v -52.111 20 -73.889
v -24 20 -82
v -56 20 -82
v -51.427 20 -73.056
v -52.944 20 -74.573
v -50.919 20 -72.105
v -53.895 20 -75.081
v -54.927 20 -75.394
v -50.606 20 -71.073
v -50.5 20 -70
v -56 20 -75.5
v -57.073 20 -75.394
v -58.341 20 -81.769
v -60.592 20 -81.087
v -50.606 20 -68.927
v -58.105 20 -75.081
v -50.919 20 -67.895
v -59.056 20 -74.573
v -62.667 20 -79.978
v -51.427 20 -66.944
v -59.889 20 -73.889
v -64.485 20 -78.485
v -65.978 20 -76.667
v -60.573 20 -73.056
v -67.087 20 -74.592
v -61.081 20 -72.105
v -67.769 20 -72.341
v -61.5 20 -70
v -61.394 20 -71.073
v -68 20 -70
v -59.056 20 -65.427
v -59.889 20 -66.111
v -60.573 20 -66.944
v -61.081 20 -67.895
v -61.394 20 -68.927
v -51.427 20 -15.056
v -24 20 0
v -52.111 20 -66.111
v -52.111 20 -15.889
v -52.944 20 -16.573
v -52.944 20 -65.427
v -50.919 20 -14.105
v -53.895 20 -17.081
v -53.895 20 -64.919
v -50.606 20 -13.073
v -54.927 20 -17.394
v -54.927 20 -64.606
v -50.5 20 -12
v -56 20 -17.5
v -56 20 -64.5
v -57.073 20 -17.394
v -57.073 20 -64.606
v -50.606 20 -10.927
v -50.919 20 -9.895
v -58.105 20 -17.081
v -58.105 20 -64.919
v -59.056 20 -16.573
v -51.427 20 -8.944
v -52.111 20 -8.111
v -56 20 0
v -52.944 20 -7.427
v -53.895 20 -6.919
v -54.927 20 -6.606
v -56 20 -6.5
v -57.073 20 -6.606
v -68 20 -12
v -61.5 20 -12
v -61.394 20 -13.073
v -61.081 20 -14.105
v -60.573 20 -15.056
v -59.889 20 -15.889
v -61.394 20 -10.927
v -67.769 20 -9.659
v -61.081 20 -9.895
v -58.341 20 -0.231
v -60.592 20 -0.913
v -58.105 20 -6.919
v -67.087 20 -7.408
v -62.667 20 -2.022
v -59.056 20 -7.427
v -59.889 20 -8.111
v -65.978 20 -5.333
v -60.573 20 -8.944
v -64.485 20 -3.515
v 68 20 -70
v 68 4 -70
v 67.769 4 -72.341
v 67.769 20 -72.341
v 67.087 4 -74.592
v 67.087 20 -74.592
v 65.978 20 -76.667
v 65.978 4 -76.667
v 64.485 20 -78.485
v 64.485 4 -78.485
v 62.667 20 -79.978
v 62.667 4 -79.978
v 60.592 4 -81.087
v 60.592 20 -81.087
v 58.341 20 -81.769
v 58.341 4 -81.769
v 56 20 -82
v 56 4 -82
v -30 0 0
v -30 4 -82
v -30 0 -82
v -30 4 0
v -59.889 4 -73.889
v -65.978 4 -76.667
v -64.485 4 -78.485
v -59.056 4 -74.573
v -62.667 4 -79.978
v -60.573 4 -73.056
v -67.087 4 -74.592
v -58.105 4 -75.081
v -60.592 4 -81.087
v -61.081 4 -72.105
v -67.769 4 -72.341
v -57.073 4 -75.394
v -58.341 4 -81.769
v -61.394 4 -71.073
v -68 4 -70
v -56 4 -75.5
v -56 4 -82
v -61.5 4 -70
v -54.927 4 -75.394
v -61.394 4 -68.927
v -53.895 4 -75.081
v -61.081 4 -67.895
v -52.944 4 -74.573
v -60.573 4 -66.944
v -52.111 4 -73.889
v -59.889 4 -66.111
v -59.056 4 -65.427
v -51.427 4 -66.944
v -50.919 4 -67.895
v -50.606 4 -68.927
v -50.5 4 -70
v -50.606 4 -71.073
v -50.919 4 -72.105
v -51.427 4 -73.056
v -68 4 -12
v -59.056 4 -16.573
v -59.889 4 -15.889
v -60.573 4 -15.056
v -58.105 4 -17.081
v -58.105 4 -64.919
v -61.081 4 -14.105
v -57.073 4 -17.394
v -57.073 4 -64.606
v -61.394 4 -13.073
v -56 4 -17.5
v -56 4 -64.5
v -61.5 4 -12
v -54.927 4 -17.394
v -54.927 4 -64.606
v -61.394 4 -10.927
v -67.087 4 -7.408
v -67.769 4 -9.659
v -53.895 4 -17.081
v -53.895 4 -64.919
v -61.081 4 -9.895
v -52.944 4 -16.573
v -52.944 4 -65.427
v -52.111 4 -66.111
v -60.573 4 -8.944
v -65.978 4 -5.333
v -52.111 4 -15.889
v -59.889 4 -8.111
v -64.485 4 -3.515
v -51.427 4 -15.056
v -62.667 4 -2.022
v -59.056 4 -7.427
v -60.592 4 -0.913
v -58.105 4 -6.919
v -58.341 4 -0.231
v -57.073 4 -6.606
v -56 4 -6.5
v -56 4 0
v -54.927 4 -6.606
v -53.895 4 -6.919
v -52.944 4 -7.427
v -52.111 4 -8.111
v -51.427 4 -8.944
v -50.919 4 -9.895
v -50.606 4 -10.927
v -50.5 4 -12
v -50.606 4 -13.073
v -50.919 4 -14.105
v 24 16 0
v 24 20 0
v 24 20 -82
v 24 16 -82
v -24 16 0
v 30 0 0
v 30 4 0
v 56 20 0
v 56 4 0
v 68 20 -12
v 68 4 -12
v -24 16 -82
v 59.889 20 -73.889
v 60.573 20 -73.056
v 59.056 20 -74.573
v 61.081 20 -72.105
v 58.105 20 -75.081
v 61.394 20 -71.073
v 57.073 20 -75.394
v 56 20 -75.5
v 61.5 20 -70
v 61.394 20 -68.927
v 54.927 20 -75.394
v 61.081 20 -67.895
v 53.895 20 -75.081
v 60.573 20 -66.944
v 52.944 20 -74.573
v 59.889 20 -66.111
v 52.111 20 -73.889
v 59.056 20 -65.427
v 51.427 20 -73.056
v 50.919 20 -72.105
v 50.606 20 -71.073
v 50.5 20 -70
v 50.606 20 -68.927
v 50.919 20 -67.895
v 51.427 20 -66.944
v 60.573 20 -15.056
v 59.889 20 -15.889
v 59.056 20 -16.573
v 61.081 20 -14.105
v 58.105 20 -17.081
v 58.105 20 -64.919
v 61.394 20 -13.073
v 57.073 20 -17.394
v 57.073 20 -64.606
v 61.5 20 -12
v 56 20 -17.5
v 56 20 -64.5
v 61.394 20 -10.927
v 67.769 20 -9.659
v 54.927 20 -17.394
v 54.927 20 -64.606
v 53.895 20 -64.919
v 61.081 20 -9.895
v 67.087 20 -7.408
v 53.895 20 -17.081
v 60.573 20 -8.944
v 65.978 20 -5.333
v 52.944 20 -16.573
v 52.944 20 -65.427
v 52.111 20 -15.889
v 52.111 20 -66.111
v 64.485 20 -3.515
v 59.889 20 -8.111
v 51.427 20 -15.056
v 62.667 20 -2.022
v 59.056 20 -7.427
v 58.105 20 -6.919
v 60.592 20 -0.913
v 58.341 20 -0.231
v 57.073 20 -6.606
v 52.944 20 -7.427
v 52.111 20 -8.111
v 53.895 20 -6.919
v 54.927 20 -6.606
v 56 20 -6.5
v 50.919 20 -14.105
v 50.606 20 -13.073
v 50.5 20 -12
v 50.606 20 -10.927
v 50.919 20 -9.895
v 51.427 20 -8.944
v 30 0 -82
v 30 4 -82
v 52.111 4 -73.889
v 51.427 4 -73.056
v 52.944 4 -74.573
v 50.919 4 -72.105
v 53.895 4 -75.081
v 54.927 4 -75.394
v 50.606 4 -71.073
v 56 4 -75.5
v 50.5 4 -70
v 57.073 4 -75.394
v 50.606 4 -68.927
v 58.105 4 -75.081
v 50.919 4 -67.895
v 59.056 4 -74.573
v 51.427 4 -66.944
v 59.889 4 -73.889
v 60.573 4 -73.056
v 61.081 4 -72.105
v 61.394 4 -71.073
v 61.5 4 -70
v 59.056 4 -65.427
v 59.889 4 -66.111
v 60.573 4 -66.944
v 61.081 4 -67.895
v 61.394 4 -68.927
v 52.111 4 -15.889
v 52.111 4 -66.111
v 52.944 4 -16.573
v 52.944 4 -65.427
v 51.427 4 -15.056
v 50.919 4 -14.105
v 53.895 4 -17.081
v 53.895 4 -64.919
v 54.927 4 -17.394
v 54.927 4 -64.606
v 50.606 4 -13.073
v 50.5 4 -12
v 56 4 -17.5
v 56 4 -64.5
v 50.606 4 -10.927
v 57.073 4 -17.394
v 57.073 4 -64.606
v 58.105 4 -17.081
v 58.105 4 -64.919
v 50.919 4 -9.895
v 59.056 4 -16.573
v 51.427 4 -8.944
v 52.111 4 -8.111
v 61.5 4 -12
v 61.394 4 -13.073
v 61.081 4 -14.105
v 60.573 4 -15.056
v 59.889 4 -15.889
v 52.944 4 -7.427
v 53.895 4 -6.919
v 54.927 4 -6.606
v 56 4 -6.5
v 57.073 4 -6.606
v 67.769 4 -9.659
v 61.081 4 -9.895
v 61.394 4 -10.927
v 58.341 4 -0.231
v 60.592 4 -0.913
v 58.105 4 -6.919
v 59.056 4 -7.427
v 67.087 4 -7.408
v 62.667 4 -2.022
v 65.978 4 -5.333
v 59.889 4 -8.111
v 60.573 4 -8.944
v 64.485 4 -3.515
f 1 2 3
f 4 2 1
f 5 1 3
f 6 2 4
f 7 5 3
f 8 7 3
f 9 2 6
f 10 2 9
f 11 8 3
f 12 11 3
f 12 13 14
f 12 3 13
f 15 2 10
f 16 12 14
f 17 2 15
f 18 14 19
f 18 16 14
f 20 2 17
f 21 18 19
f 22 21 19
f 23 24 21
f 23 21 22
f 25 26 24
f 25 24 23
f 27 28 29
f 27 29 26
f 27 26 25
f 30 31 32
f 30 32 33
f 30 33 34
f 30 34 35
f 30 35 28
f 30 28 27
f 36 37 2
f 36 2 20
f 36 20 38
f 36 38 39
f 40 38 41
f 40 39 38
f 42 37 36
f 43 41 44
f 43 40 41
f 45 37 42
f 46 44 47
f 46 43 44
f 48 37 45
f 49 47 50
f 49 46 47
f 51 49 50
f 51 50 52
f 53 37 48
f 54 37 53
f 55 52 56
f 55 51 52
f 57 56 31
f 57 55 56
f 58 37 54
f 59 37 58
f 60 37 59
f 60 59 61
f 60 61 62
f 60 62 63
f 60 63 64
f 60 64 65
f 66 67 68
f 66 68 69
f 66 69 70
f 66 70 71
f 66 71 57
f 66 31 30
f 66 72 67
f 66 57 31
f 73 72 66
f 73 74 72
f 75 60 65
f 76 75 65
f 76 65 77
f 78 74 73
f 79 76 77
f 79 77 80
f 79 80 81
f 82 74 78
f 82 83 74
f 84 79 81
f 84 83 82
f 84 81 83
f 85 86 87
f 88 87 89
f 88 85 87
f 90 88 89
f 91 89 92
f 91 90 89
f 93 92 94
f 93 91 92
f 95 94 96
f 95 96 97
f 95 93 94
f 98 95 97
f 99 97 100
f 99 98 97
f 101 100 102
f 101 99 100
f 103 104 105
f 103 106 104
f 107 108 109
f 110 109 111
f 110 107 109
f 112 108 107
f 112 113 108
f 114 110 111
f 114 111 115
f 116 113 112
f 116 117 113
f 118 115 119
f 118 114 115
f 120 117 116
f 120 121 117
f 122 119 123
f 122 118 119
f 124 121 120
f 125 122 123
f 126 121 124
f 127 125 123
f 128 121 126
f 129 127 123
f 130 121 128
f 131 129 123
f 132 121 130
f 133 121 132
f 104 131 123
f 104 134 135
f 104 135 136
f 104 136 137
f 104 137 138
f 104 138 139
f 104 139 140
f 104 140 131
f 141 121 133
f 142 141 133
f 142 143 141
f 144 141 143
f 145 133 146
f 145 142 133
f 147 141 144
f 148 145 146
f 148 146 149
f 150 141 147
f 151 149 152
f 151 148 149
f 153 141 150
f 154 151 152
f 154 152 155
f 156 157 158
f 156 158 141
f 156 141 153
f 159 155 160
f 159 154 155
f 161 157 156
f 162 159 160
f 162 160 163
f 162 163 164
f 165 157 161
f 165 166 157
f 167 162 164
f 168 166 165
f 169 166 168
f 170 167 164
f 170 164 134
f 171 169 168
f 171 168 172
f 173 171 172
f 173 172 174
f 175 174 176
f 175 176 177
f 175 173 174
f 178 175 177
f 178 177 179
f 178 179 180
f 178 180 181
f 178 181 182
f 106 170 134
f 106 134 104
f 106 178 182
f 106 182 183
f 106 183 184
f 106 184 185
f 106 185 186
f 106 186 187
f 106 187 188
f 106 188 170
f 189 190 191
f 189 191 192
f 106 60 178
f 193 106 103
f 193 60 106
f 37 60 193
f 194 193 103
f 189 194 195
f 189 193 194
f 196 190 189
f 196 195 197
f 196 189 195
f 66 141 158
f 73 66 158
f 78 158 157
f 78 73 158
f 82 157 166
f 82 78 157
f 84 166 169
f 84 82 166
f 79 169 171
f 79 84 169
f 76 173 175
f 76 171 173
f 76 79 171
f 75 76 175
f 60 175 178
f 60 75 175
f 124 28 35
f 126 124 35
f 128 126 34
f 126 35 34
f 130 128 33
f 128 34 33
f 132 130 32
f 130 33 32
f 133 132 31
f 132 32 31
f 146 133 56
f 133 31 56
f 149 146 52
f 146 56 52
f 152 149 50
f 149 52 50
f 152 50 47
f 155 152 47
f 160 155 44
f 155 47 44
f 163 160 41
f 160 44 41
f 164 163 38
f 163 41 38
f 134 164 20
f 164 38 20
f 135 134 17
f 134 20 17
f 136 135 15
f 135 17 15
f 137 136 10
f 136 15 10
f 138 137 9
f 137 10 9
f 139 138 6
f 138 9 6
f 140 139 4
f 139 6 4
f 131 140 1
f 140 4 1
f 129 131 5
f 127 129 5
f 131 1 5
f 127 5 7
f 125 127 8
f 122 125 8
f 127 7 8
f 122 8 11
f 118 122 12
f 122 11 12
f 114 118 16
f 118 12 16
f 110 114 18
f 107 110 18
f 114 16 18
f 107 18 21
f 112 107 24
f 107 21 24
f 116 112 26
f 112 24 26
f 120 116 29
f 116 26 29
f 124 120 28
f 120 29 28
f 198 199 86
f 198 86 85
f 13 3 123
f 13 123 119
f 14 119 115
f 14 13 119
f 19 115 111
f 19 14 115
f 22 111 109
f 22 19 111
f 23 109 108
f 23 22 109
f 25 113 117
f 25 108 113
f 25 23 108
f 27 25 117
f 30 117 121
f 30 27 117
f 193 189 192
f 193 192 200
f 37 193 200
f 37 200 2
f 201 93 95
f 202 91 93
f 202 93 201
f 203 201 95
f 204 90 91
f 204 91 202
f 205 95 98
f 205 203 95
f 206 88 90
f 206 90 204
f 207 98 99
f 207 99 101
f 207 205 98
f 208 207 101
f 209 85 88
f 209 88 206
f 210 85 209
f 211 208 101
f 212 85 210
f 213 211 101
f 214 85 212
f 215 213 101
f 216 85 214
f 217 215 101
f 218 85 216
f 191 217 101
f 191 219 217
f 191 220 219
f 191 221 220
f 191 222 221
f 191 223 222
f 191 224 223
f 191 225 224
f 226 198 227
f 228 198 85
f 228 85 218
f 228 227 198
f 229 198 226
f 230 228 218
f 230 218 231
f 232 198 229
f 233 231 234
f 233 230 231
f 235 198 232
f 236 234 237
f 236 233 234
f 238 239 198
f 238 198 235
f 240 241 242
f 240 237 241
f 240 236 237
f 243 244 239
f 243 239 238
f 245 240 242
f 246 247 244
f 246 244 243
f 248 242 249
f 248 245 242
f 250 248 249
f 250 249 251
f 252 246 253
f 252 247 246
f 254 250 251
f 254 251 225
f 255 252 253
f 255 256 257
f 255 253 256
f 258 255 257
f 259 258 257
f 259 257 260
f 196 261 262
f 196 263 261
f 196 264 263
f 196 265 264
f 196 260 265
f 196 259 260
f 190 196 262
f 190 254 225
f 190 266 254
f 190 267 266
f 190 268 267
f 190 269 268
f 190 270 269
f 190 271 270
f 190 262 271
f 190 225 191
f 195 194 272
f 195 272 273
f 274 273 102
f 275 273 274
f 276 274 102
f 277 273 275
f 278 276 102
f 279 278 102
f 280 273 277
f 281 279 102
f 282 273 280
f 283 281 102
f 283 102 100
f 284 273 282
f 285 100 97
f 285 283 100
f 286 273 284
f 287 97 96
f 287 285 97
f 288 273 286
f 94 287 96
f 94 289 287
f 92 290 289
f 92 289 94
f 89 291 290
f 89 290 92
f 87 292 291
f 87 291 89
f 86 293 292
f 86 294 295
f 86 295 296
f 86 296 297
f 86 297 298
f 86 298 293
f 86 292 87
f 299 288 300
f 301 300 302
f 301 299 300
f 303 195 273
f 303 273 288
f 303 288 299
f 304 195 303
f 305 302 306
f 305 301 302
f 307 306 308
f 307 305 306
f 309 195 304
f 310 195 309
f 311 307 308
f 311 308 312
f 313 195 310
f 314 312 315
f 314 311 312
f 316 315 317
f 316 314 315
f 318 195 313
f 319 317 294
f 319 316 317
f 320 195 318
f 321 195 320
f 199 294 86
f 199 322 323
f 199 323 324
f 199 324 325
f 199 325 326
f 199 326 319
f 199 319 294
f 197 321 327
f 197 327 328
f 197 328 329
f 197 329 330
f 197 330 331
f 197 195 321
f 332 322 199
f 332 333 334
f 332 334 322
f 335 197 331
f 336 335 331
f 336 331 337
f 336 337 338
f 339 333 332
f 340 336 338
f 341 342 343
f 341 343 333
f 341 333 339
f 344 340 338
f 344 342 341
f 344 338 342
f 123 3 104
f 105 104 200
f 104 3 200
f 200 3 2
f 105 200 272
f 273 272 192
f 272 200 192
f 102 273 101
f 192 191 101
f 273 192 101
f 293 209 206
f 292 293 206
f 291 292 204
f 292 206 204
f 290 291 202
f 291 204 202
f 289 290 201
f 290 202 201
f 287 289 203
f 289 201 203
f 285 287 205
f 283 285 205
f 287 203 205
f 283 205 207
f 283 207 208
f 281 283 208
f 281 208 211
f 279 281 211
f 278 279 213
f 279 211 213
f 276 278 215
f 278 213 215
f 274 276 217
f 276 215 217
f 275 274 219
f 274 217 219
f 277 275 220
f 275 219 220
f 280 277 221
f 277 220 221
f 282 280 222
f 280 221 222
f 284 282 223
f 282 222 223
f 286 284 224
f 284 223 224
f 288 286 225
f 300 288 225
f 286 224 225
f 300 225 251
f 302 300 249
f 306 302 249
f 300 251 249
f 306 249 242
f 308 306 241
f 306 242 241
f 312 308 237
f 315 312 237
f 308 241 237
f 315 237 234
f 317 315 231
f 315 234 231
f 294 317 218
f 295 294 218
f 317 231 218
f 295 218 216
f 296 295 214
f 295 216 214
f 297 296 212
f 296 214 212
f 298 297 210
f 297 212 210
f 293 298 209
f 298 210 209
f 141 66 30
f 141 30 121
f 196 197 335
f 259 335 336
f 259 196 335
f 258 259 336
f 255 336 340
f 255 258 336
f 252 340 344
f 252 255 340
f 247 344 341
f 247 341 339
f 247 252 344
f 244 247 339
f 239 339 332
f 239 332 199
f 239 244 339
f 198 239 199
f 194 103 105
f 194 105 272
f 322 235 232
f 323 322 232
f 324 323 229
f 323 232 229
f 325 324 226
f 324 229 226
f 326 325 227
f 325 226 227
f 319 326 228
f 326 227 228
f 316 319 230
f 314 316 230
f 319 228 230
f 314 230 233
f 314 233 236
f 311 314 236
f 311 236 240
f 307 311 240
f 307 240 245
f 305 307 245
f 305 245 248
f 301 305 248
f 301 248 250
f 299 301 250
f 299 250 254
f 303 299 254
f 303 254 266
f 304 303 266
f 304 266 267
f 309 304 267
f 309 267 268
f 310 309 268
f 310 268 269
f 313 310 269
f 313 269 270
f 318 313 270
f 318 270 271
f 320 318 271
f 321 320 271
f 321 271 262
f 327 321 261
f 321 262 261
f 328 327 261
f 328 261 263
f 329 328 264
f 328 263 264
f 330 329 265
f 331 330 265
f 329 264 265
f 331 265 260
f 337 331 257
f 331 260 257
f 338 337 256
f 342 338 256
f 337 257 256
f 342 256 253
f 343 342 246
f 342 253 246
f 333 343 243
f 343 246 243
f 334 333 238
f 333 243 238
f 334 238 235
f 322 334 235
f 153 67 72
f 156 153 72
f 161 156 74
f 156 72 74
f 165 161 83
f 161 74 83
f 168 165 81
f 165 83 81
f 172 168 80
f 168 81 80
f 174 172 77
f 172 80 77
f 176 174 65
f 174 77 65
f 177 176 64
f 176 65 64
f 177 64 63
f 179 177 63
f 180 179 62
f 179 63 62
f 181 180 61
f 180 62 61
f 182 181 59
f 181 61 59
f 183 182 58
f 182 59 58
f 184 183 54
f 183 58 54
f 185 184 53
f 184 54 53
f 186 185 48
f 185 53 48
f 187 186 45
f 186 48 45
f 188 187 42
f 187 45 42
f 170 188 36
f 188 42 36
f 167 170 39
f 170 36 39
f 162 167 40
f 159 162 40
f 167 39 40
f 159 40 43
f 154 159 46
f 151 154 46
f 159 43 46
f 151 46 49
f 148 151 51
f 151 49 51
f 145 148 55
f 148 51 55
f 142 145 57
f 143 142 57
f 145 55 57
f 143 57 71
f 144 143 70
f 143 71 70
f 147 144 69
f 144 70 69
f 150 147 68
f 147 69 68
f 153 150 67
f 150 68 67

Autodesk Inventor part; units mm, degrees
ref_plane "YZ Plane" through (0, 0, 0) normal (1, 0, 0) x (0, 1, 0)
ref_plane "XZ Plane" through (0, 0, 0) normal (0, 1, 0) x (-1, 0, 0)
ref_plane "XY Plane" through (0, 0, 0) normal (0, 0, 1) x (1, 0, 0)
sketch "Sketch1" plane through (0, 0, 0) normal (0, 0, 1) x (1, 0, 0)
  line L0 (0, 0) -> (30, 0)
  line L1 (30, 0) -> (30, 4)
  line L2 (30, 4) -> (68, 4)
  line L3 (68, 4) -> (68, 20)
  line L4 (68, 20) -> (24, 20)
  line L5 (24, 20) -> (24, 16)
  line L6 (24, 16) -> (0, 16)
  line L7 (0, 16) -> (0, 0)
  dimension "d0" = 30
  dimension "d1" = 4
  dimension "d2" = 38
  dimension "d3" = 16
  dimension "d4" = 44
  dimension "d5" = 4
extrude "Extrusion1" add sketch "Sketch1" against normal blind 82
sketch "Sketch2" plane through (24, 20, 0) normal (0, 1, 0) x (1, 0, 0)
  circle A0 centre (32, 12) radius 5.5
  circle A1 centre (32, 70) radius 5.5
  line L0 (44, 0) -> (44, 82) projected
  line L1 (44, 0) -> (0, 0) projected
  line L2 (0, 82) -> (44, 82) projected
  point P0 (-24, 0)
  dimension "d8" = 11
  dimension "d9" = 11
  dimension "d10" = 12
  dimension "d11" = 12
  dimension "d12" = 12
  dimension "d13" = 12
extrude "Extrusion2" cut sketch "Sketch2" against normal blind 82 contours A0
extrude "Extrusion3" cut sketch "Sketch2" against normal blind 82 contours A1
fillet "Fillet1" radius 12 1 edges at (68, 12, 0)
fillet "Fillet2" radius 12 1 edges at (68, 12, -82)
mirror "Mirror1" about plane through (0, 0, 0) normal (1, 0, 0) of "Extrusion1", "Fillet1", "Extrusion2", "Extrusion3", "Fillet2"
properties part number "topPlate" material "Steel, Carbon"
